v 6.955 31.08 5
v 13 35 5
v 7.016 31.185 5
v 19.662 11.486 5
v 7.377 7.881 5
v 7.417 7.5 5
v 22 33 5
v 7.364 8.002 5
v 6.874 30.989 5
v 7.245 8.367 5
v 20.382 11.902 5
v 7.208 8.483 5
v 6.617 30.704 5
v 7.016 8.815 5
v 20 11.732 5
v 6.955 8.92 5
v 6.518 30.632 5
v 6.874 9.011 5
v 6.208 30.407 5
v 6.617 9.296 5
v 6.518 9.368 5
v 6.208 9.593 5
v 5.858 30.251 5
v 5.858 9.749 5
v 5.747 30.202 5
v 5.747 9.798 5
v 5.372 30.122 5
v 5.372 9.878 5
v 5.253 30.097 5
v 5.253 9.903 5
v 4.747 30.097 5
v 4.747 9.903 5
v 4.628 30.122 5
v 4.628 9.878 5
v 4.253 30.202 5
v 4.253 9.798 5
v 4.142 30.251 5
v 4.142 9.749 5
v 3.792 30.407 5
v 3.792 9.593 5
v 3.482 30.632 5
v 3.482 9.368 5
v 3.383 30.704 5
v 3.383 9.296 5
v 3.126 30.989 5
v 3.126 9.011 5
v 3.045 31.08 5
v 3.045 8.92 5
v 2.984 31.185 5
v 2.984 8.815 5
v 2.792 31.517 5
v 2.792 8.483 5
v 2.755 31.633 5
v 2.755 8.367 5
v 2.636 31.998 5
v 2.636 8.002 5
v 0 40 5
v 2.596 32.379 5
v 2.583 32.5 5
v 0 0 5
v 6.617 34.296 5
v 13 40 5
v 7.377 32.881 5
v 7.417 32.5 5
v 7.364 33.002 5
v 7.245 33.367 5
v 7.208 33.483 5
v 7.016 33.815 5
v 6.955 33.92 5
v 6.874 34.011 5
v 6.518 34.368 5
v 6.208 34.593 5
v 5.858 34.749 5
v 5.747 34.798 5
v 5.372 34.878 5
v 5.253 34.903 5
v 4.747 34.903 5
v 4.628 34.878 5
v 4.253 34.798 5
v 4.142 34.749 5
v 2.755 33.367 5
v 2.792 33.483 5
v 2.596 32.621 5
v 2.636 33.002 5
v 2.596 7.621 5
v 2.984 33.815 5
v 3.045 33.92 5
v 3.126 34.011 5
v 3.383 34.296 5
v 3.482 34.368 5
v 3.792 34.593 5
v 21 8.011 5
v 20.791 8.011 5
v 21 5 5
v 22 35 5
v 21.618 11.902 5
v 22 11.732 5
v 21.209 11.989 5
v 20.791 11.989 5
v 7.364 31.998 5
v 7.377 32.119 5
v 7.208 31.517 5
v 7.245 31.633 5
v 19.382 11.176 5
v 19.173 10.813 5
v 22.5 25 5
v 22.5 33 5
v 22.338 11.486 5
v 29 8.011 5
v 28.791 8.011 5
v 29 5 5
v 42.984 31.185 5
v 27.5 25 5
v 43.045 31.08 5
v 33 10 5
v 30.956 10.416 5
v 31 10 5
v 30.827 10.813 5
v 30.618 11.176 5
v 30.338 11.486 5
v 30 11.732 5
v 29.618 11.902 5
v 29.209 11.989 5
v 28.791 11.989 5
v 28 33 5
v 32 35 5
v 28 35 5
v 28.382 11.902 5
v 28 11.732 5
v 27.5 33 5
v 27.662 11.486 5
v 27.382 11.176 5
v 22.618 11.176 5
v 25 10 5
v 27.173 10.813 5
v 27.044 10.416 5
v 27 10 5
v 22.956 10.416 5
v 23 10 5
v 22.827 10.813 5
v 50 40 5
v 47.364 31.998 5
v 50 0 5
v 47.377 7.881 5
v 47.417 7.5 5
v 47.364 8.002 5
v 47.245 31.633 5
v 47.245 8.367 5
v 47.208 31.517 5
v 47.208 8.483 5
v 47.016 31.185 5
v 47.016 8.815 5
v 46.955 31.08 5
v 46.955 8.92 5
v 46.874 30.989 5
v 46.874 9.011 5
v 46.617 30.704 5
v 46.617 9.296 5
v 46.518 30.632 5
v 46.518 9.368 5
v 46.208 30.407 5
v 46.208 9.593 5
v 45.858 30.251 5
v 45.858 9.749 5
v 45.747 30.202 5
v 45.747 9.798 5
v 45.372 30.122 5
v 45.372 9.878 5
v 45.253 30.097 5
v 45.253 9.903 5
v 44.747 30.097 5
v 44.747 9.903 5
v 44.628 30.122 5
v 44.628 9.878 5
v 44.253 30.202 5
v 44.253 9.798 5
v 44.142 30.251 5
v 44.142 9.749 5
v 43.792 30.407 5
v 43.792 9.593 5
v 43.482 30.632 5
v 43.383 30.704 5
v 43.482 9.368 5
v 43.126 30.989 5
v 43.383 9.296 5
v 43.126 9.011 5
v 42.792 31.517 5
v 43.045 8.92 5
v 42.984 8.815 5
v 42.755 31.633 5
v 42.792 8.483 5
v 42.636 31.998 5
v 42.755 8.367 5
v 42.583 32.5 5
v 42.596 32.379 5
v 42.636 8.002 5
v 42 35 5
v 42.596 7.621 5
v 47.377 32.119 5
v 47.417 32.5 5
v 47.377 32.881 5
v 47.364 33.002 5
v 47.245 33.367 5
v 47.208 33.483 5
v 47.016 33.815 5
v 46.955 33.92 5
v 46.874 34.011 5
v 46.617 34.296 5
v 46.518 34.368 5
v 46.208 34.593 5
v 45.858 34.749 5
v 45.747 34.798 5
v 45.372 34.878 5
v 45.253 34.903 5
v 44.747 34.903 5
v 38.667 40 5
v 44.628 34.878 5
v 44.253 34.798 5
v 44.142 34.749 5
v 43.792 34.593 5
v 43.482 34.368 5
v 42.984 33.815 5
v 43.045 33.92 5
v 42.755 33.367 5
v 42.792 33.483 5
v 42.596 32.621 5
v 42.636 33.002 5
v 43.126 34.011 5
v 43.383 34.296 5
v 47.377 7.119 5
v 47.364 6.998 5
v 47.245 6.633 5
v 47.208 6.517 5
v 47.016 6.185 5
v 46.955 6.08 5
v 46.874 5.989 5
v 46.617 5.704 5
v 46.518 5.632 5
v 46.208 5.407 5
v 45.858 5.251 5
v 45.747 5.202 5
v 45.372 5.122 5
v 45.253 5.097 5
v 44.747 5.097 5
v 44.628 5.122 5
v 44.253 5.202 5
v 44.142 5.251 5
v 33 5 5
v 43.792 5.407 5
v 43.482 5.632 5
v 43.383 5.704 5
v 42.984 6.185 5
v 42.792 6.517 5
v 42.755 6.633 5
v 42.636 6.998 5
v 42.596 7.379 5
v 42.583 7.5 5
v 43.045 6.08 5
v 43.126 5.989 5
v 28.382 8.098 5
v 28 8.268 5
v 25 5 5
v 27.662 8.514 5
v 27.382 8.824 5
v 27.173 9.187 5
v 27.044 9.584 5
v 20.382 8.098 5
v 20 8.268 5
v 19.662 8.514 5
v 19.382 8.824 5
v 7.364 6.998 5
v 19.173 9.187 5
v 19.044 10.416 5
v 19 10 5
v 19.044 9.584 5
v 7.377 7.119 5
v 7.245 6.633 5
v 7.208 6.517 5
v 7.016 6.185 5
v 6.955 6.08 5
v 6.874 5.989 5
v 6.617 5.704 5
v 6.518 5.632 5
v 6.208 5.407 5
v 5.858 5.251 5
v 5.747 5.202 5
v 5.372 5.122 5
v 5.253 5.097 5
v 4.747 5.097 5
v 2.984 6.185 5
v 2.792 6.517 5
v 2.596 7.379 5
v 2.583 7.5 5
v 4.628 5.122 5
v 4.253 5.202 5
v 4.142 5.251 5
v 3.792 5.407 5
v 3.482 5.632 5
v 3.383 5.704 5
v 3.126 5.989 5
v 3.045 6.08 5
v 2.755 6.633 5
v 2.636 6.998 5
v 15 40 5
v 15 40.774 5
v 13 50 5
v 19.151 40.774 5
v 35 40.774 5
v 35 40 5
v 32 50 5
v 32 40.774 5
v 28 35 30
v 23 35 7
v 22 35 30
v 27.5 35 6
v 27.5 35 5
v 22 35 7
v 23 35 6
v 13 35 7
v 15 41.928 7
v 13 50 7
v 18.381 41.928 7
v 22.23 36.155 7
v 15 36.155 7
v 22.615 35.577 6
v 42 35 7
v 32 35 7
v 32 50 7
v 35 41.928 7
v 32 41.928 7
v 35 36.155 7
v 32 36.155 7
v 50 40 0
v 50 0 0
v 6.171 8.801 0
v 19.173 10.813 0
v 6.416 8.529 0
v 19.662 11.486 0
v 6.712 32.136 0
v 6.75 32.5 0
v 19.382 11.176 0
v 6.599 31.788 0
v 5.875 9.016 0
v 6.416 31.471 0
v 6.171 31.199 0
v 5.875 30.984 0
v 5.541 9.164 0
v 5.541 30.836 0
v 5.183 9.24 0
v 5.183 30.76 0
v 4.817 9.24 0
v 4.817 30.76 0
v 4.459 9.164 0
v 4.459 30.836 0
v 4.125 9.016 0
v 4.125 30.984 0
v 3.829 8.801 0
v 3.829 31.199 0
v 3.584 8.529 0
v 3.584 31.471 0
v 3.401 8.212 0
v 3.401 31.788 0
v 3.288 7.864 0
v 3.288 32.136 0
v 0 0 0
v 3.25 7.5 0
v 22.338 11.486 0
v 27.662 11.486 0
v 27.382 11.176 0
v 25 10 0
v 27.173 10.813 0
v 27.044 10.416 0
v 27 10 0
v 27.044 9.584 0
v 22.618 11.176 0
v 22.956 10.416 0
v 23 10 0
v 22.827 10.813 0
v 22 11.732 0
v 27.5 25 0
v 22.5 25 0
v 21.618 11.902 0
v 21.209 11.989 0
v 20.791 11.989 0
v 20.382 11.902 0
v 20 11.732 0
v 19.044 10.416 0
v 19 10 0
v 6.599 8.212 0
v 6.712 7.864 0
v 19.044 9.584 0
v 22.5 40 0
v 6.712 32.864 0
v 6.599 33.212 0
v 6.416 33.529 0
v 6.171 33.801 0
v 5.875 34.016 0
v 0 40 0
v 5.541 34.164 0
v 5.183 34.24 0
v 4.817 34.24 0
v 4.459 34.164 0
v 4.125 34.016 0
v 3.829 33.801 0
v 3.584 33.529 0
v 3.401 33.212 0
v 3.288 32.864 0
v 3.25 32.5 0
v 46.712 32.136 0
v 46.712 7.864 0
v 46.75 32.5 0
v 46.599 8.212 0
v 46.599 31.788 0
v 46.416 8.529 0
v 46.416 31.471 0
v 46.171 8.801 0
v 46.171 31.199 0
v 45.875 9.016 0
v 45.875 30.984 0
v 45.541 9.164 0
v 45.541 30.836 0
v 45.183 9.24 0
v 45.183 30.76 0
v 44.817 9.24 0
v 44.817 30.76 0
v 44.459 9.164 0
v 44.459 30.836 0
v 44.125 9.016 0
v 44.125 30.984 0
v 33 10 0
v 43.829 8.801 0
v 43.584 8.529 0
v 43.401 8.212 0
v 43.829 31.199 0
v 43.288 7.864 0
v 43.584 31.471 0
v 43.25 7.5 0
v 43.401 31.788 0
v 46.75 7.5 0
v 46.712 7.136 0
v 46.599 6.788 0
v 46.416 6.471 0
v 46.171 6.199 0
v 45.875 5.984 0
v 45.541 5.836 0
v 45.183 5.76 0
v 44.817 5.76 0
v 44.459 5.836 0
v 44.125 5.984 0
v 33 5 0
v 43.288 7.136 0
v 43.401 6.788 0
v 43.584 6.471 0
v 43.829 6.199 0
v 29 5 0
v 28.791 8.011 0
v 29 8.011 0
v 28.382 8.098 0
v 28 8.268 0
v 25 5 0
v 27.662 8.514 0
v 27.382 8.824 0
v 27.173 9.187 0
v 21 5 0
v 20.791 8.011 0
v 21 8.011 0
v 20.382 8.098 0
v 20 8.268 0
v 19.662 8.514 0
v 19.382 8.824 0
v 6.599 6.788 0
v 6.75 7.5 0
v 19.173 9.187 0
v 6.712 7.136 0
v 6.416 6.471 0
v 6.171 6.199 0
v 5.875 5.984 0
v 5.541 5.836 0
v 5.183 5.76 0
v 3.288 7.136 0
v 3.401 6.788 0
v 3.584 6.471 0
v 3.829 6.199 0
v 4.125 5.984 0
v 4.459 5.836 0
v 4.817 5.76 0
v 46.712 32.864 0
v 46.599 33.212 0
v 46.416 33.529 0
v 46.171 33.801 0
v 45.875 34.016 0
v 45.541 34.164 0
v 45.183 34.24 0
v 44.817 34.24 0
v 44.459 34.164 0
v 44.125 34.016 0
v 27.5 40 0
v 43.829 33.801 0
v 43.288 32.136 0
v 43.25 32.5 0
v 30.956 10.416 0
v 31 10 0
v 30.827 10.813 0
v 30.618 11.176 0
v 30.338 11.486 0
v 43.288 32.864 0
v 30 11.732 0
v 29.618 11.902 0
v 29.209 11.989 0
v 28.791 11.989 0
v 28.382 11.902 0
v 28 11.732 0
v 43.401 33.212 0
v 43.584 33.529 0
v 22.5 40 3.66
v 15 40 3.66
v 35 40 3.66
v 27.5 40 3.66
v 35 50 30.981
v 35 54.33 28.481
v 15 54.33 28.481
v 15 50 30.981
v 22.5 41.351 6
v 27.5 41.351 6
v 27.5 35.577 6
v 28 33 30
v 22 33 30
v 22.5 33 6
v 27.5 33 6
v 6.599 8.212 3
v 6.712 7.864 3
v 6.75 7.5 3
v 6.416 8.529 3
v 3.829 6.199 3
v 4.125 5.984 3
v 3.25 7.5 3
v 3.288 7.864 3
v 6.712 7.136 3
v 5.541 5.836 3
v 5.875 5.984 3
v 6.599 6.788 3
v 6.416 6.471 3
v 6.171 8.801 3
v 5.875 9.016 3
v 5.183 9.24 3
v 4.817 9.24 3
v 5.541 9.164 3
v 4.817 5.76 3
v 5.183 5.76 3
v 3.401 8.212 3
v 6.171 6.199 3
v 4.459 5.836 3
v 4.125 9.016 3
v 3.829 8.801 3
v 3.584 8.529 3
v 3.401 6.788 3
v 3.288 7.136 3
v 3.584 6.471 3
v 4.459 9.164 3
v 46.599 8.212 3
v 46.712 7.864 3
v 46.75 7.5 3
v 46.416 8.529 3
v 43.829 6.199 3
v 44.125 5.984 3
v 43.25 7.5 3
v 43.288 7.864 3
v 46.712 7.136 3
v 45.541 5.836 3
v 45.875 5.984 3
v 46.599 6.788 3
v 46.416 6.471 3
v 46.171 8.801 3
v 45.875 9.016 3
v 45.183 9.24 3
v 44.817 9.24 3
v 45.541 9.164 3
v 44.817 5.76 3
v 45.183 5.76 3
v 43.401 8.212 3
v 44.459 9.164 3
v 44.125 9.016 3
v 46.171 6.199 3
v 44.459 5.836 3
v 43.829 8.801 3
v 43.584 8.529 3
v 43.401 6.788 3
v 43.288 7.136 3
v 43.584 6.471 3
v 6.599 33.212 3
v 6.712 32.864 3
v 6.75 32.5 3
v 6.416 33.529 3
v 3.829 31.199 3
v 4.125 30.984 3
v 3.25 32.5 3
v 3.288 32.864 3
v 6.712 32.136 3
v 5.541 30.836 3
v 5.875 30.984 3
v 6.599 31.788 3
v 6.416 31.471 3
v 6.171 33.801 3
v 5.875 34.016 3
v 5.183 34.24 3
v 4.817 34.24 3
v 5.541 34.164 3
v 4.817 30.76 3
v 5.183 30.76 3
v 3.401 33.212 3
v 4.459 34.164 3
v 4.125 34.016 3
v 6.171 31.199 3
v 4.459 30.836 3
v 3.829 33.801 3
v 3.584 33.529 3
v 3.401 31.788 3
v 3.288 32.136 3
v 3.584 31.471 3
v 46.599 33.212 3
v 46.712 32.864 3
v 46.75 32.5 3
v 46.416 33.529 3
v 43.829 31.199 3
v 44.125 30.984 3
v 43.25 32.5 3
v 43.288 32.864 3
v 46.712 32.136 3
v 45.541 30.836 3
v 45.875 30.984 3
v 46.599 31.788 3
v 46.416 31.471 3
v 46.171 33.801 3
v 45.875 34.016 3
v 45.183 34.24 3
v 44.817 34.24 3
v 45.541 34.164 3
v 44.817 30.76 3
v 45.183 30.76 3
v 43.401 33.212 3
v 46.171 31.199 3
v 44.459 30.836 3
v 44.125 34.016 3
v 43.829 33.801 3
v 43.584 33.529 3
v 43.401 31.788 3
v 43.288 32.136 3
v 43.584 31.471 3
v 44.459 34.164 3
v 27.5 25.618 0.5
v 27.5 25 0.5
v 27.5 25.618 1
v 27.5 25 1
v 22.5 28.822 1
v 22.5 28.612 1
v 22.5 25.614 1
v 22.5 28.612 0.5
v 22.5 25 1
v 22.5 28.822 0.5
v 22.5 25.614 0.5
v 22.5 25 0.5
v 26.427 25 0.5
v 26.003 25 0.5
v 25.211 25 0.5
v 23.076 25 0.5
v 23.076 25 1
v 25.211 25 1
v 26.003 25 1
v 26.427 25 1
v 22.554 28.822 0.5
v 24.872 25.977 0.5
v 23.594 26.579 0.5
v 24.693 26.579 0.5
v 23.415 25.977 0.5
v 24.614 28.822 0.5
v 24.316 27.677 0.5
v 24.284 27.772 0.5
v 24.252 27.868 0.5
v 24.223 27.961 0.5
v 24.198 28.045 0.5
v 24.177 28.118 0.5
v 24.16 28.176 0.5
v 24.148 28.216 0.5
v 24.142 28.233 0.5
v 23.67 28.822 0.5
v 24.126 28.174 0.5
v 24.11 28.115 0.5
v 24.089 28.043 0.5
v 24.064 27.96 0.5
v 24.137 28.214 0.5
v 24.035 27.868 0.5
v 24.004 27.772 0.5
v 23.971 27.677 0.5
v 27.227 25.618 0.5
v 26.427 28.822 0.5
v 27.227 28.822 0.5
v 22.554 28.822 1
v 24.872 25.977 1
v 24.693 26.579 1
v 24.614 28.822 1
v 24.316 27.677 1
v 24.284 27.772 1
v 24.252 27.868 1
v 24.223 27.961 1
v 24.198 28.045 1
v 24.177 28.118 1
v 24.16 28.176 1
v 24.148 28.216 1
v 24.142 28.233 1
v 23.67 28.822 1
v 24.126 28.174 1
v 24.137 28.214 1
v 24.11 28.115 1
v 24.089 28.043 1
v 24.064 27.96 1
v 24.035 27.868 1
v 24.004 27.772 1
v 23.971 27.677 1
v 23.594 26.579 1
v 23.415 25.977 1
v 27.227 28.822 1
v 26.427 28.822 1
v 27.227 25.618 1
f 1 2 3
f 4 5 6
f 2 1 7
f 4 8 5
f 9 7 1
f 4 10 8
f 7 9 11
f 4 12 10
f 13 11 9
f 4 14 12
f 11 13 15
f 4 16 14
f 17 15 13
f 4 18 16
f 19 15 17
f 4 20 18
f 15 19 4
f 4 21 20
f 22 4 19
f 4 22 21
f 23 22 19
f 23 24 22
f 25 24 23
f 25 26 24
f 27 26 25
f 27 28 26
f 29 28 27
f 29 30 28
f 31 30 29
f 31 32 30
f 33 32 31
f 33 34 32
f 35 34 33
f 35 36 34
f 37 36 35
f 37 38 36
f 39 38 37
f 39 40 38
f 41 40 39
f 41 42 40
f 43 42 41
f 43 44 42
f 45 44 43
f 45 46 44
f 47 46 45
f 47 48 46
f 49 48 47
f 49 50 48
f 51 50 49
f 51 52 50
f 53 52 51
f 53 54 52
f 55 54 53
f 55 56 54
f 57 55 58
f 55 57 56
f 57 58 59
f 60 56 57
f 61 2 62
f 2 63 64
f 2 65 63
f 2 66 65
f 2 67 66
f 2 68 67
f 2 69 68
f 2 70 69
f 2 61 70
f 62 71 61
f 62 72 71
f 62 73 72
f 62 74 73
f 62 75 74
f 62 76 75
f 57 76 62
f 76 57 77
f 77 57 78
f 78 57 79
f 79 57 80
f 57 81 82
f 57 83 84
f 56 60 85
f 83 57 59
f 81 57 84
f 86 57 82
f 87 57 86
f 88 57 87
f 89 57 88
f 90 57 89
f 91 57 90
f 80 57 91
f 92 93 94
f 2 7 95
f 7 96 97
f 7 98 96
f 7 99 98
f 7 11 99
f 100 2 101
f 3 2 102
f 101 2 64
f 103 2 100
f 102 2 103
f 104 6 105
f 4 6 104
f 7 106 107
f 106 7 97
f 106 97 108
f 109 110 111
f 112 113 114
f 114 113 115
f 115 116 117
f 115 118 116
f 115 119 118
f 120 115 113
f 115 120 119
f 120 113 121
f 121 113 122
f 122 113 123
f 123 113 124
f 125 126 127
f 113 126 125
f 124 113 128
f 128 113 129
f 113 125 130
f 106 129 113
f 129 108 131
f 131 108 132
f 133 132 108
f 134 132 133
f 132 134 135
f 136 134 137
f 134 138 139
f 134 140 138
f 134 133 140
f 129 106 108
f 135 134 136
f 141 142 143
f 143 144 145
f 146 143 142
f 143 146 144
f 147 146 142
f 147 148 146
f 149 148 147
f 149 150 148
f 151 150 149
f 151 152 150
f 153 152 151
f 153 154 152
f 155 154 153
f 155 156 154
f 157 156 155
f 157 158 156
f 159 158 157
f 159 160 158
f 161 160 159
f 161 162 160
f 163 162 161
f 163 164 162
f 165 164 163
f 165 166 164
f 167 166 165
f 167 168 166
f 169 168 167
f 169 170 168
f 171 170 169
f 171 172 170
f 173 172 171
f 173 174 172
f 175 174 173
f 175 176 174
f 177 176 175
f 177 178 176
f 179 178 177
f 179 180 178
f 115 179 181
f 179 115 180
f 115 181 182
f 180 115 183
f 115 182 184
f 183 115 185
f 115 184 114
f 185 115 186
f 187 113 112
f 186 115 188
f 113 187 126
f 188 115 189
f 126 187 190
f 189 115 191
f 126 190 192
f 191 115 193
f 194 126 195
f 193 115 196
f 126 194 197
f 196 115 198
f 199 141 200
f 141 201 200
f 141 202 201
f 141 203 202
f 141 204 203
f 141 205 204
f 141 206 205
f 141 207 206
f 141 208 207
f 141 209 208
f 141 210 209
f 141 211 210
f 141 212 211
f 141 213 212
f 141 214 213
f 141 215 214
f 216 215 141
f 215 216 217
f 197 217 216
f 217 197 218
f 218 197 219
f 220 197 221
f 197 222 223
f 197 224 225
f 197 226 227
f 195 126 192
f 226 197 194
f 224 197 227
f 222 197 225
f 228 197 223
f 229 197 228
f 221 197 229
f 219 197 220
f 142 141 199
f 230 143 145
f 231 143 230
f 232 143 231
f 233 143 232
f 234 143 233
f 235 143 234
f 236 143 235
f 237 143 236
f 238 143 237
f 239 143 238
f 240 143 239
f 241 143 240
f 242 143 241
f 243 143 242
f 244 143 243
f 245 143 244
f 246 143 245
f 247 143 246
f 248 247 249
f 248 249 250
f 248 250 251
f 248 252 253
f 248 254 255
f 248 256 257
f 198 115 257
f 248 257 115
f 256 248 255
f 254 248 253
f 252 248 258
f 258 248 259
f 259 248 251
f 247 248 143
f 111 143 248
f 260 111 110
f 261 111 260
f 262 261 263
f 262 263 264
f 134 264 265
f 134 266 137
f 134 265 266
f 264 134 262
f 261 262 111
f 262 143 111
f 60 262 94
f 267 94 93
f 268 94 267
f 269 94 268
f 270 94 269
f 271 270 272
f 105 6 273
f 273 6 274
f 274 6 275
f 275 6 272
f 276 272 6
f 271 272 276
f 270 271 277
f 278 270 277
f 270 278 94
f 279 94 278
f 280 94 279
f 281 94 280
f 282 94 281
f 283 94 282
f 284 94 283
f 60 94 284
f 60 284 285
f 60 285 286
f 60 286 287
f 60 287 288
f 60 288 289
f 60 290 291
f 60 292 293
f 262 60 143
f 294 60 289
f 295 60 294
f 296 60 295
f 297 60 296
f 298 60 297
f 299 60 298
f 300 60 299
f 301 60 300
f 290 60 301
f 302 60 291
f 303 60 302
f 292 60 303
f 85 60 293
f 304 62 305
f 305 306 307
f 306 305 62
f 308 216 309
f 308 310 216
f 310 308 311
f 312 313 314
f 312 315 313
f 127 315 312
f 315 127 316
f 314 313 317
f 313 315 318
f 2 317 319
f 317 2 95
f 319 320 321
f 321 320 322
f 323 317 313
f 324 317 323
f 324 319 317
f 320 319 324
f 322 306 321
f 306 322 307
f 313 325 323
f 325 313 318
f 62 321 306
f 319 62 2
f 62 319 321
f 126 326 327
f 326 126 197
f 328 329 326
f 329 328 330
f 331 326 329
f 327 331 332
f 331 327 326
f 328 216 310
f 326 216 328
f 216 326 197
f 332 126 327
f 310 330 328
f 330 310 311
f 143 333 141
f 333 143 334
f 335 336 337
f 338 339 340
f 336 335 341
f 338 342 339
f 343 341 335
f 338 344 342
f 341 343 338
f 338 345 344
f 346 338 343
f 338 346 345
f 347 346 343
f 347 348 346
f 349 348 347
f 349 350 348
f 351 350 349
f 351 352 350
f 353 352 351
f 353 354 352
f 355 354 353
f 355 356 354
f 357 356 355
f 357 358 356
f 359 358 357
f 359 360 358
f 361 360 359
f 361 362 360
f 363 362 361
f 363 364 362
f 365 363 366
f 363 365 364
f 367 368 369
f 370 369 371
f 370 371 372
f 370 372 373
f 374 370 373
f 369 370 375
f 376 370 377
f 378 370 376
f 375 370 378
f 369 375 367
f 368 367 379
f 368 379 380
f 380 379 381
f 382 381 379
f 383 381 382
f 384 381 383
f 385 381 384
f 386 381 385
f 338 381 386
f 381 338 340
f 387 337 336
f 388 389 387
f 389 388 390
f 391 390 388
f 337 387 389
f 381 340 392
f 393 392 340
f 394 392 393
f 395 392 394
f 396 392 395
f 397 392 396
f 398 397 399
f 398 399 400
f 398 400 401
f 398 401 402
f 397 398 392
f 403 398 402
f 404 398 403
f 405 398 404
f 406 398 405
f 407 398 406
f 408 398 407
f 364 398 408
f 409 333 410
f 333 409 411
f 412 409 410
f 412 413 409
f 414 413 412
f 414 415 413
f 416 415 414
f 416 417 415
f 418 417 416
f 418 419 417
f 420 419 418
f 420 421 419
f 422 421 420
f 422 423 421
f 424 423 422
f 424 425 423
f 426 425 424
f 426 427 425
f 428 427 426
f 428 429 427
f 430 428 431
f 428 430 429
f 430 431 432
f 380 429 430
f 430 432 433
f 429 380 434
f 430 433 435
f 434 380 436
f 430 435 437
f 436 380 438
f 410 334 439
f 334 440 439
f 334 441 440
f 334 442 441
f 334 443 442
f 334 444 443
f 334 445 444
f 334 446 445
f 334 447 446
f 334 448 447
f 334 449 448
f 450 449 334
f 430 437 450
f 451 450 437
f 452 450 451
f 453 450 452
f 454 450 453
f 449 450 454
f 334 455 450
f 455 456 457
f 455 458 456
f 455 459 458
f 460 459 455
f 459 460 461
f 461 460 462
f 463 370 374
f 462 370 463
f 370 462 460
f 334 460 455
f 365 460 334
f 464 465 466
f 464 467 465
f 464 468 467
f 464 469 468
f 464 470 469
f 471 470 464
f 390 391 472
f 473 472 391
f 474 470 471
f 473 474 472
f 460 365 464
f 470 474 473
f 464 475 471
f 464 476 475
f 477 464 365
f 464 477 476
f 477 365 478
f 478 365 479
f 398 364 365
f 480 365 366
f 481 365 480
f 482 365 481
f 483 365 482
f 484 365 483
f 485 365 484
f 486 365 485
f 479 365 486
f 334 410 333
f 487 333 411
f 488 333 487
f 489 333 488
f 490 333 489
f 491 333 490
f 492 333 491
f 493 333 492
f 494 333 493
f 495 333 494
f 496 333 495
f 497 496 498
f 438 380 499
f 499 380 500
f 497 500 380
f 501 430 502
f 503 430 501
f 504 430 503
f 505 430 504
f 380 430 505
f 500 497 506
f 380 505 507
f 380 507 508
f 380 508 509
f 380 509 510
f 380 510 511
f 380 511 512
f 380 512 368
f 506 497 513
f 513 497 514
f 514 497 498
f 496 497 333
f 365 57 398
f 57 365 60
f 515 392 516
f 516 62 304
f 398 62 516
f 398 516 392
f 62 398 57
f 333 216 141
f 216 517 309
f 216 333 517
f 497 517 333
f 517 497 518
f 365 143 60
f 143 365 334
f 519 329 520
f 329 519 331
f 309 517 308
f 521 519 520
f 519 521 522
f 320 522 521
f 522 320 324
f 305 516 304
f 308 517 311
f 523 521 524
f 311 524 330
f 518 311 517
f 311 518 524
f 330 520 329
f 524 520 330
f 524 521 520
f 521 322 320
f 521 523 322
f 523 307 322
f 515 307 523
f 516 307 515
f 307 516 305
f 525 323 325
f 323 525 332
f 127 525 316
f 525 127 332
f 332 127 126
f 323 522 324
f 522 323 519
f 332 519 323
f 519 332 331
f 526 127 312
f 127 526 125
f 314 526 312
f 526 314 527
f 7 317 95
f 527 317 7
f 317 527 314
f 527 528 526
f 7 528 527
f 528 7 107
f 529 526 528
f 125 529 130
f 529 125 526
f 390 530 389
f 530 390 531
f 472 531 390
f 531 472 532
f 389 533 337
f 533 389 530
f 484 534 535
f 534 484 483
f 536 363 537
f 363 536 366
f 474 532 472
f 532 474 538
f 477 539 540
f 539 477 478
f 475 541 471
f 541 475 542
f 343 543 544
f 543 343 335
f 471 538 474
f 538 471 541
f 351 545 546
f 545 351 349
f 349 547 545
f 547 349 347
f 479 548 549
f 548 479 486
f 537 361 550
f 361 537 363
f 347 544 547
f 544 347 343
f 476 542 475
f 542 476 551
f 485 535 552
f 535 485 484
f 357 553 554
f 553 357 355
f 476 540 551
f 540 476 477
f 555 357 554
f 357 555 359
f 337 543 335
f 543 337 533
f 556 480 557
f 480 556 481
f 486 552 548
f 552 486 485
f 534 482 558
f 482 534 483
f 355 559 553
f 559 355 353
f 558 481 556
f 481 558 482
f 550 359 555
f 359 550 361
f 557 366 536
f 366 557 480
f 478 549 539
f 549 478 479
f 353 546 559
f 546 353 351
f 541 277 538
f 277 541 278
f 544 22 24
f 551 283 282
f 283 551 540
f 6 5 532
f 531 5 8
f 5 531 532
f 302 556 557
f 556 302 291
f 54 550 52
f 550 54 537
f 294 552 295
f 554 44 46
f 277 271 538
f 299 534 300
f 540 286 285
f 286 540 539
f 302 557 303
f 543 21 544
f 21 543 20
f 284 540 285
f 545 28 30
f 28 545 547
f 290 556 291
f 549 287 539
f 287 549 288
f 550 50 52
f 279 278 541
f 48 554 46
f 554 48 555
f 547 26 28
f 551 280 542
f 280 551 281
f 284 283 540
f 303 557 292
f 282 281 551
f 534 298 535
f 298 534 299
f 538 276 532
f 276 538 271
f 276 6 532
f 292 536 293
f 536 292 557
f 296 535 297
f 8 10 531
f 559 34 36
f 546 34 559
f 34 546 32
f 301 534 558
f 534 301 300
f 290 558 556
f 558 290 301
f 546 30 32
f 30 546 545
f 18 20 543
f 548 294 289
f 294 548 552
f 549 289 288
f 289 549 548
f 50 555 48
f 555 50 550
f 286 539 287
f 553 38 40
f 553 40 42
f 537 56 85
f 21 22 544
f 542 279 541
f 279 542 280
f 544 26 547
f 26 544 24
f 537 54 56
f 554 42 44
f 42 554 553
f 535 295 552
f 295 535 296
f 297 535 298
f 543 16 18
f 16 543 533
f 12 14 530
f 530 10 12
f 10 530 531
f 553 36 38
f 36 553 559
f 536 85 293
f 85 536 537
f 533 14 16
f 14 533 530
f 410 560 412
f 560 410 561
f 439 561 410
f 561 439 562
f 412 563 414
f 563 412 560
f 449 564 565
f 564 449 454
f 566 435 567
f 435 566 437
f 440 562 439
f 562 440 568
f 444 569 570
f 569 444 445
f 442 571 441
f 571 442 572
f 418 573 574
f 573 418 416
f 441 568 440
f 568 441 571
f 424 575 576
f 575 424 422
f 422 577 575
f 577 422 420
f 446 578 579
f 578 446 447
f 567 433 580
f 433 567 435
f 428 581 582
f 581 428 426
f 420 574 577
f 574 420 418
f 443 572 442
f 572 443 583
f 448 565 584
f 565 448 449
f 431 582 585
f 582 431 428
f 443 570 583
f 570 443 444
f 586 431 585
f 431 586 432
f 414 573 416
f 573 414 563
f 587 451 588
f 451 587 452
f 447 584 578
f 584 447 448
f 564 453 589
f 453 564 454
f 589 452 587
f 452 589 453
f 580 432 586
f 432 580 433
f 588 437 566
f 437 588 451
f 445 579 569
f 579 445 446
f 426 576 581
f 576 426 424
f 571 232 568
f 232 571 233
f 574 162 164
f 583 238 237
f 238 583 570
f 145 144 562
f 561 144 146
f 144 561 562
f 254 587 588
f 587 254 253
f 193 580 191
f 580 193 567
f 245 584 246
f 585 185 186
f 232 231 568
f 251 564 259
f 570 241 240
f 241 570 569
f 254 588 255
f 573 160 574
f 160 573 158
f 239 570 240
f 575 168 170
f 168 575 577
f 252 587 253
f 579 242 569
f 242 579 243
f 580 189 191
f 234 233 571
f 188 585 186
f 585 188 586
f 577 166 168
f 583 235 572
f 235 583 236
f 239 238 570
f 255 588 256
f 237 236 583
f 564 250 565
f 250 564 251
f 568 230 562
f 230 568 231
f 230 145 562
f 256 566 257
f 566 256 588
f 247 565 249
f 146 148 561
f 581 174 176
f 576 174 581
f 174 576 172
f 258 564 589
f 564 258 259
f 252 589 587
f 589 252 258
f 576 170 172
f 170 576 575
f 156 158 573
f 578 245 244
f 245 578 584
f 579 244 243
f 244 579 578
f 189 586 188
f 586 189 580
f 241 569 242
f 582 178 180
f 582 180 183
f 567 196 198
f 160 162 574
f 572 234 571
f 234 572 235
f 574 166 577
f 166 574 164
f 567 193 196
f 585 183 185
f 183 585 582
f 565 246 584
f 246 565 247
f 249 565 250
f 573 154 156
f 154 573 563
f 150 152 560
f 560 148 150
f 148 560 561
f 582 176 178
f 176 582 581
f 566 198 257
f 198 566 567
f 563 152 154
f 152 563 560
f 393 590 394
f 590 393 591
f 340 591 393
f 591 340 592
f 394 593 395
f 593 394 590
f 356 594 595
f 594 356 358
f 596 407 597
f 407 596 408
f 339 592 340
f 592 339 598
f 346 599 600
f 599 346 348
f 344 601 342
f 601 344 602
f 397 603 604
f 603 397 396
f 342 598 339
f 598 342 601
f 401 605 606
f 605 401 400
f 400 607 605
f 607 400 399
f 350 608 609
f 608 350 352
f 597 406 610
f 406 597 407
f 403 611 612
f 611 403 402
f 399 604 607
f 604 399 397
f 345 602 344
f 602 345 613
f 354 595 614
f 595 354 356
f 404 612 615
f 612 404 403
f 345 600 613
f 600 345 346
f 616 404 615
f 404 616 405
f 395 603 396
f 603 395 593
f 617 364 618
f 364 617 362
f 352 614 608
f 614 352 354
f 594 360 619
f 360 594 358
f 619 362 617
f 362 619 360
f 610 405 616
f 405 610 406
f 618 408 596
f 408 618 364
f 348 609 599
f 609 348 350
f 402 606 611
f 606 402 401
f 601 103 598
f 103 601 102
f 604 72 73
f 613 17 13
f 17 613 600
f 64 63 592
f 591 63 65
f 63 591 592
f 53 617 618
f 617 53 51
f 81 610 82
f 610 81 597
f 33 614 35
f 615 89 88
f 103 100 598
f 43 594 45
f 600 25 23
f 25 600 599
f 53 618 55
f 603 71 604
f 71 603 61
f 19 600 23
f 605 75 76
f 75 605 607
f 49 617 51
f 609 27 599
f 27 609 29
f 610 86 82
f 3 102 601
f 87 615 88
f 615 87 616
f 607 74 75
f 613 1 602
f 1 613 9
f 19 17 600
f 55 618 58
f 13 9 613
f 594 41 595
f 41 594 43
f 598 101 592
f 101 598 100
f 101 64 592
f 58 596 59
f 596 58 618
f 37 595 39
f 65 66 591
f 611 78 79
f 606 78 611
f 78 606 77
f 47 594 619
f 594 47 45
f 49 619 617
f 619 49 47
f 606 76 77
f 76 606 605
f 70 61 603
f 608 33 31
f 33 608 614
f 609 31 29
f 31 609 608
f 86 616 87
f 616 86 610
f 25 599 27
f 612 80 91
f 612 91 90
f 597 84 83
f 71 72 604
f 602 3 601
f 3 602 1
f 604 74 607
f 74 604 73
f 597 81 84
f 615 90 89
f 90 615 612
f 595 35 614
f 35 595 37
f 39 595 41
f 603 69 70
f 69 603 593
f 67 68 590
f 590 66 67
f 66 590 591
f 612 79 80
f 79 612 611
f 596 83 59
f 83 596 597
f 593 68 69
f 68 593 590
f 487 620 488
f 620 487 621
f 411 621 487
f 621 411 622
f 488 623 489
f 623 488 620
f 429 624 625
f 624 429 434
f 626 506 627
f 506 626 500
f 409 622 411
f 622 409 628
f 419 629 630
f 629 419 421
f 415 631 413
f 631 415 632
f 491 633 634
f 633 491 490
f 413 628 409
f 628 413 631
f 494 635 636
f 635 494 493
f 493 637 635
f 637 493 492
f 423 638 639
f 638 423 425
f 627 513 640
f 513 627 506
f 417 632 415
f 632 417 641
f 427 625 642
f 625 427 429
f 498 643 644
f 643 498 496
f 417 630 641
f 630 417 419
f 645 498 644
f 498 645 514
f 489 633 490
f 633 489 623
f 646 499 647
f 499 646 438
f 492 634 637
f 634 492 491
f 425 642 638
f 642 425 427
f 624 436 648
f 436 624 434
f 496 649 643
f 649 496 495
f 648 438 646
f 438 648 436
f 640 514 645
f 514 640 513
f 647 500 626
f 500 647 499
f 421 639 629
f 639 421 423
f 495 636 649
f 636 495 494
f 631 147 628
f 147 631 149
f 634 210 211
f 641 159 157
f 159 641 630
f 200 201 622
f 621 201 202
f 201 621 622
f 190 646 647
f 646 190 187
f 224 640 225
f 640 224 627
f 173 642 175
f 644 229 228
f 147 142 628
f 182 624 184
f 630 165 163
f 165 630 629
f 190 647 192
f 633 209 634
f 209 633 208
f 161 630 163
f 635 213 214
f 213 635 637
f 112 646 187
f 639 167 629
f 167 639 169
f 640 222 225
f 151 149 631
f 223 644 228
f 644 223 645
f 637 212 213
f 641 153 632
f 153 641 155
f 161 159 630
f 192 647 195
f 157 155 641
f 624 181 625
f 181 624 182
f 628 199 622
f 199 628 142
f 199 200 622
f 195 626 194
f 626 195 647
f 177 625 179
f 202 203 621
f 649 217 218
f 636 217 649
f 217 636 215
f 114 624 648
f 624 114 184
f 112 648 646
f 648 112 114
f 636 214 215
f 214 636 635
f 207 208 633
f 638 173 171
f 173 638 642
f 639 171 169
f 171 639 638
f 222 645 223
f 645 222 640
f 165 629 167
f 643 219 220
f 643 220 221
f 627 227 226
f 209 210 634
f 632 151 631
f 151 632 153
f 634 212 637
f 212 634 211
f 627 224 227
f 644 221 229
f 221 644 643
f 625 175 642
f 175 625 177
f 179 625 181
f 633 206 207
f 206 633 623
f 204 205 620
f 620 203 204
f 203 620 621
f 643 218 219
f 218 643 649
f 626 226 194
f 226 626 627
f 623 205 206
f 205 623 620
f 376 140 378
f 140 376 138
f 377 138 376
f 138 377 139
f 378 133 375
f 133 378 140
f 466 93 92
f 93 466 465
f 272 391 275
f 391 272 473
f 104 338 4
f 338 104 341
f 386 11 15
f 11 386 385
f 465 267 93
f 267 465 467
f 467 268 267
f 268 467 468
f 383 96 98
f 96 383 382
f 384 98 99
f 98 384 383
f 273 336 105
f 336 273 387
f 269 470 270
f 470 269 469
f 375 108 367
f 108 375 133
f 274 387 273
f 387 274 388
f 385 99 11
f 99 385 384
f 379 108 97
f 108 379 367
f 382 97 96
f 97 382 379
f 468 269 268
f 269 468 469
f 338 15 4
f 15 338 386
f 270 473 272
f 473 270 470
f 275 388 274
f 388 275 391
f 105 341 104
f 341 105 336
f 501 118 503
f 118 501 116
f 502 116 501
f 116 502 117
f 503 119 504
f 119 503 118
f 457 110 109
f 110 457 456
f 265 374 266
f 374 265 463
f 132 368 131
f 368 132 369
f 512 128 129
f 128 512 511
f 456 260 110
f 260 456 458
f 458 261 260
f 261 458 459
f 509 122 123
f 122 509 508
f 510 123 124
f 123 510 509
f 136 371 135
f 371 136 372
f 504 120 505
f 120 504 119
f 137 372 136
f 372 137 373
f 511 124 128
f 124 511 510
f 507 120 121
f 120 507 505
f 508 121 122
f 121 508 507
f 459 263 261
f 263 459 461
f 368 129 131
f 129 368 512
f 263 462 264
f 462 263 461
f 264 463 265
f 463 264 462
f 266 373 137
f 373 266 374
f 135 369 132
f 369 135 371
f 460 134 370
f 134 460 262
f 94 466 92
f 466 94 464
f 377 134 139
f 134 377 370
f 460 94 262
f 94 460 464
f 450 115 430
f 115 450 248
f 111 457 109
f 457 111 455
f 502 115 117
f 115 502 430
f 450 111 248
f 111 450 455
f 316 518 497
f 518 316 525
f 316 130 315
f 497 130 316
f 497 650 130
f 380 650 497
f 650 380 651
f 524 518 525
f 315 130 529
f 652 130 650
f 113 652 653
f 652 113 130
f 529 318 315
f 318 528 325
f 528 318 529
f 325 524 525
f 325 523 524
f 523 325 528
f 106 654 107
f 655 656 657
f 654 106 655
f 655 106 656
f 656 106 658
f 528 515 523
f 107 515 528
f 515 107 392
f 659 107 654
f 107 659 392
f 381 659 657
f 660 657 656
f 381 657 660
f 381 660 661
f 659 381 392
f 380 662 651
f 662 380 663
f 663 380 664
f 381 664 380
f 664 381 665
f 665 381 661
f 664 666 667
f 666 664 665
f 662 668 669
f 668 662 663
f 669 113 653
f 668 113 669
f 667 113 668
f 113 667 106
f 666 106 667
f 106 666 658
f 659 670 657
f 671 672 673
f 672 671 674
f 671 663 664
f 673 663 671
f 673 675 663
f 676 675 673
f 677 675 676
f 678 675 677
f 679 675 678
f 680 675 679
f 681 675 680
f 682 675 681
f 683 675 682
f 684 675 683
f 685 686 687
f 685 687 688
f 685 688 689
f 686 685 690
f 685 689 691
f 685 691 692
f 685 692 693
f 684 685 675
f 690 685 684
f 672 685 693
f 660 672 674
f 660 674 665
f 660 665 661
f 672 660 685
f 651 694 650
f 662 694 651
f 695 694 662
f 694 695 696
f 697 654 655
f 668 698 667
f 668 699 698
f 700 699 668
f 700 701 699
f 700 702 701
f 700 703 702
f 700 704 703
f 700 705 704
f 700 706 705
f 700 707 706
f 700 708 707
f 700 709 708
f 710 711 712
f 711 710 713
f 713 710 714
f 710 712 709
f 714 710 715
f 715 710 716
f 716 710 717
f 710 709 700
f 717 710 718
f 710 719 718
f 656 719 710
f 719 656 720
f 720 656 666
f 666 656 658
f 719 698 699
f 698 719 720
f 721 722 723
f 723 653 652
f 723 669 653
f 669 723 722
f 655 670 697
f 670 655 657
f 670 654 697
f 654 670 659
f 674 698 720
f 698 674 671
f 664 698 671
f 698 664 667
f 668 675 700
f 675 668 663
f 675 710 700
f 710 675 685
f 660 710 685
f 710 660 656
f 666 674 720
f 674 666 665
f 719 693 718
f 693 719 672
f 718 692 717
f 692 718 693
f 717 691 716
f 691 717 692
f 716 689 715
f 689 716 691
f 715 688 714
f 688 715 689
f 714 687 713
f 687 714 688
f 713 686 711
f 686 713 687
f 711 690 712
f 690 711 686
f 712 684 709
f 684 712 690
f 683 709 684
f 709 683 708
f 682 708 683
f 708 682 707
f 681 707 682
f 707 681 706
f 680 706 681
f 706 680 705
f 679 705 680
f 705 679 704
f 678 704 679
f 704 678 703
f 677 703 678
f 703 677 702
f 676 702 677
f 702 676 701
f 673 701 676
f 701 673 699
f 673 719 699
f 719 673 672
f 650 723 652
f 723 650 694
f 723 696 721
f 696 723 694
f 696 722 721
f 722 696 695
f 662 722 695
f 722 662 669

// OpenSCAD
// ESP32-CAM Security Camera - Wall Mount Bracket
// For Creality Ender-3 V3
// Material: Hyper-PAL (Grey) or Hyper-PETG
// Print with 40-50% infill for strength

// ===== PARAMETERS =====
case_length = 50;
bracket_width = 40;
bracket_thickness = 5;
wall_thickness = 2;

// Mounting holes
case_mount_spacing_x = 40;  // Distance between screw holes horizontally
case_mount_spacing_y = 25;  // Distance between screw holes vertically
wall_mount_spacing = 8;     // Distance between wall mounting holes
mount_hole_diameter = 3.5;  // M3 screw clearance (3mm + tolerance)
wall_hole_diameter = 4;     // Wall screw/anchor size

// Angle adjustment
tilt_angle = 30;  // Default downward tilt (0-45 degrees)

// ===== WALL MOUNT BRACKET =====

module wall_mount_base() {
    difference() {
        union() {
            // Base plate (attaches to wall)
            cube([case_length, bracket_width, bracket_thickness]);

            // Angled mounting arm
            translate([case_length/2 - 10, bracket_width - bracket_thickness, bracket_thickness])
                rotate([-tilt_angle, 0, 0])
                cube([20, 5, 30]);

            // Reinforcement ribs (triangular gussets)
            for (x = [case_length/2 - 12, case_length/2 + 7]) {
                translate([x, bracket_width - bracket_thickness, bracket_thickness])
                    rotate([0, 0, 0])
                    linear_extrude(height=2)
                    polygon([
                        [0, 0],
                        [0, 15],
                        [10, 0]
                    ]);
            }

            // Cable routing channel (along back of arm)
            translate([case_length/2 - 3, bracket_width - bracket_thickness - 2, bracket_thickness])
                cube([6, 2, 25]);
        }

        // Case mounting holes (4 holes matching rear cover bosses)
        case_mount_positions = [
            [case_length/2 - case_mount_spacing_x/2, bracket_width/2 - case_mount_spacing_y/2],
            [case_length/2 + case_mount_spacing_x/2, bracket_width/2 - case_mount_spacing_y/2],
            [case_length/2 - case_mount_spacing_x/2, bracket_width/2 + case_mount_spacing_y/2],
            [case_length/2 + case_mount_spacing_x/2, bracket_width/2 + case_mount_spacing_y/2]
        ];

        for (pos = case_mount_positions) {
            translate([pos[0], pos[1], -1])
                cylinder(h=bracket_thickness+2, d=mount_hole_diameter, $fn=30);

            // Countersink for screw heads
            translate([pos[0], pos[1], bracket_thickness - 2])
                cylinder(h=3, d1=mount_hole_diameter, d2=mount_hole_diameter+2, $fn=30);
        }

        // Wall mounting holes (2 holes for drywall anchors)
        translate([case_length/2 - wall_mount_spacing/2, 10, -1])
            cylinder(h=bracket_thickness+2, d=wall_hole_diameter, $fn=30);

        translate([case_length/2 + wall_mount_spacing/2, 10, -1])
            cylinder(h=bracket_thickness+2, d=wall_hole_diameter, $fn=30);

        // Keyhole slot for easy hanging (optional - top hole elongated)
        translate([case_length/2 - wall_mount_spacing/2, 10 - 5, -1])
            cube([wall_hole_diameter, 5, bracket_thickness+2]);

        translate([case_length/2 + wall_mount_spacing/2, 10 - 5, -1])
            cube([wall_hole_diameter, 5, bracket_thickness+2]);

        // Cable pass-through slot
        translate([case_length/2 - 2.5, bracket_width - 15, -1])
            cube([5, 20, bracket_thickness+2]);
    }
}

// Render the bracket
wall_mount_base();

// Add text label (optional)
translate([case_length/2, 25, 0.5])
    linear_extrude(height=0.5)
    text("WALL", size=4, font="Arial:style=Bold", halign="center");

// Print orientation note:
// Print flat on bed with base plate down
// No supports needed for this angle
// Add brim for bed adhesion
